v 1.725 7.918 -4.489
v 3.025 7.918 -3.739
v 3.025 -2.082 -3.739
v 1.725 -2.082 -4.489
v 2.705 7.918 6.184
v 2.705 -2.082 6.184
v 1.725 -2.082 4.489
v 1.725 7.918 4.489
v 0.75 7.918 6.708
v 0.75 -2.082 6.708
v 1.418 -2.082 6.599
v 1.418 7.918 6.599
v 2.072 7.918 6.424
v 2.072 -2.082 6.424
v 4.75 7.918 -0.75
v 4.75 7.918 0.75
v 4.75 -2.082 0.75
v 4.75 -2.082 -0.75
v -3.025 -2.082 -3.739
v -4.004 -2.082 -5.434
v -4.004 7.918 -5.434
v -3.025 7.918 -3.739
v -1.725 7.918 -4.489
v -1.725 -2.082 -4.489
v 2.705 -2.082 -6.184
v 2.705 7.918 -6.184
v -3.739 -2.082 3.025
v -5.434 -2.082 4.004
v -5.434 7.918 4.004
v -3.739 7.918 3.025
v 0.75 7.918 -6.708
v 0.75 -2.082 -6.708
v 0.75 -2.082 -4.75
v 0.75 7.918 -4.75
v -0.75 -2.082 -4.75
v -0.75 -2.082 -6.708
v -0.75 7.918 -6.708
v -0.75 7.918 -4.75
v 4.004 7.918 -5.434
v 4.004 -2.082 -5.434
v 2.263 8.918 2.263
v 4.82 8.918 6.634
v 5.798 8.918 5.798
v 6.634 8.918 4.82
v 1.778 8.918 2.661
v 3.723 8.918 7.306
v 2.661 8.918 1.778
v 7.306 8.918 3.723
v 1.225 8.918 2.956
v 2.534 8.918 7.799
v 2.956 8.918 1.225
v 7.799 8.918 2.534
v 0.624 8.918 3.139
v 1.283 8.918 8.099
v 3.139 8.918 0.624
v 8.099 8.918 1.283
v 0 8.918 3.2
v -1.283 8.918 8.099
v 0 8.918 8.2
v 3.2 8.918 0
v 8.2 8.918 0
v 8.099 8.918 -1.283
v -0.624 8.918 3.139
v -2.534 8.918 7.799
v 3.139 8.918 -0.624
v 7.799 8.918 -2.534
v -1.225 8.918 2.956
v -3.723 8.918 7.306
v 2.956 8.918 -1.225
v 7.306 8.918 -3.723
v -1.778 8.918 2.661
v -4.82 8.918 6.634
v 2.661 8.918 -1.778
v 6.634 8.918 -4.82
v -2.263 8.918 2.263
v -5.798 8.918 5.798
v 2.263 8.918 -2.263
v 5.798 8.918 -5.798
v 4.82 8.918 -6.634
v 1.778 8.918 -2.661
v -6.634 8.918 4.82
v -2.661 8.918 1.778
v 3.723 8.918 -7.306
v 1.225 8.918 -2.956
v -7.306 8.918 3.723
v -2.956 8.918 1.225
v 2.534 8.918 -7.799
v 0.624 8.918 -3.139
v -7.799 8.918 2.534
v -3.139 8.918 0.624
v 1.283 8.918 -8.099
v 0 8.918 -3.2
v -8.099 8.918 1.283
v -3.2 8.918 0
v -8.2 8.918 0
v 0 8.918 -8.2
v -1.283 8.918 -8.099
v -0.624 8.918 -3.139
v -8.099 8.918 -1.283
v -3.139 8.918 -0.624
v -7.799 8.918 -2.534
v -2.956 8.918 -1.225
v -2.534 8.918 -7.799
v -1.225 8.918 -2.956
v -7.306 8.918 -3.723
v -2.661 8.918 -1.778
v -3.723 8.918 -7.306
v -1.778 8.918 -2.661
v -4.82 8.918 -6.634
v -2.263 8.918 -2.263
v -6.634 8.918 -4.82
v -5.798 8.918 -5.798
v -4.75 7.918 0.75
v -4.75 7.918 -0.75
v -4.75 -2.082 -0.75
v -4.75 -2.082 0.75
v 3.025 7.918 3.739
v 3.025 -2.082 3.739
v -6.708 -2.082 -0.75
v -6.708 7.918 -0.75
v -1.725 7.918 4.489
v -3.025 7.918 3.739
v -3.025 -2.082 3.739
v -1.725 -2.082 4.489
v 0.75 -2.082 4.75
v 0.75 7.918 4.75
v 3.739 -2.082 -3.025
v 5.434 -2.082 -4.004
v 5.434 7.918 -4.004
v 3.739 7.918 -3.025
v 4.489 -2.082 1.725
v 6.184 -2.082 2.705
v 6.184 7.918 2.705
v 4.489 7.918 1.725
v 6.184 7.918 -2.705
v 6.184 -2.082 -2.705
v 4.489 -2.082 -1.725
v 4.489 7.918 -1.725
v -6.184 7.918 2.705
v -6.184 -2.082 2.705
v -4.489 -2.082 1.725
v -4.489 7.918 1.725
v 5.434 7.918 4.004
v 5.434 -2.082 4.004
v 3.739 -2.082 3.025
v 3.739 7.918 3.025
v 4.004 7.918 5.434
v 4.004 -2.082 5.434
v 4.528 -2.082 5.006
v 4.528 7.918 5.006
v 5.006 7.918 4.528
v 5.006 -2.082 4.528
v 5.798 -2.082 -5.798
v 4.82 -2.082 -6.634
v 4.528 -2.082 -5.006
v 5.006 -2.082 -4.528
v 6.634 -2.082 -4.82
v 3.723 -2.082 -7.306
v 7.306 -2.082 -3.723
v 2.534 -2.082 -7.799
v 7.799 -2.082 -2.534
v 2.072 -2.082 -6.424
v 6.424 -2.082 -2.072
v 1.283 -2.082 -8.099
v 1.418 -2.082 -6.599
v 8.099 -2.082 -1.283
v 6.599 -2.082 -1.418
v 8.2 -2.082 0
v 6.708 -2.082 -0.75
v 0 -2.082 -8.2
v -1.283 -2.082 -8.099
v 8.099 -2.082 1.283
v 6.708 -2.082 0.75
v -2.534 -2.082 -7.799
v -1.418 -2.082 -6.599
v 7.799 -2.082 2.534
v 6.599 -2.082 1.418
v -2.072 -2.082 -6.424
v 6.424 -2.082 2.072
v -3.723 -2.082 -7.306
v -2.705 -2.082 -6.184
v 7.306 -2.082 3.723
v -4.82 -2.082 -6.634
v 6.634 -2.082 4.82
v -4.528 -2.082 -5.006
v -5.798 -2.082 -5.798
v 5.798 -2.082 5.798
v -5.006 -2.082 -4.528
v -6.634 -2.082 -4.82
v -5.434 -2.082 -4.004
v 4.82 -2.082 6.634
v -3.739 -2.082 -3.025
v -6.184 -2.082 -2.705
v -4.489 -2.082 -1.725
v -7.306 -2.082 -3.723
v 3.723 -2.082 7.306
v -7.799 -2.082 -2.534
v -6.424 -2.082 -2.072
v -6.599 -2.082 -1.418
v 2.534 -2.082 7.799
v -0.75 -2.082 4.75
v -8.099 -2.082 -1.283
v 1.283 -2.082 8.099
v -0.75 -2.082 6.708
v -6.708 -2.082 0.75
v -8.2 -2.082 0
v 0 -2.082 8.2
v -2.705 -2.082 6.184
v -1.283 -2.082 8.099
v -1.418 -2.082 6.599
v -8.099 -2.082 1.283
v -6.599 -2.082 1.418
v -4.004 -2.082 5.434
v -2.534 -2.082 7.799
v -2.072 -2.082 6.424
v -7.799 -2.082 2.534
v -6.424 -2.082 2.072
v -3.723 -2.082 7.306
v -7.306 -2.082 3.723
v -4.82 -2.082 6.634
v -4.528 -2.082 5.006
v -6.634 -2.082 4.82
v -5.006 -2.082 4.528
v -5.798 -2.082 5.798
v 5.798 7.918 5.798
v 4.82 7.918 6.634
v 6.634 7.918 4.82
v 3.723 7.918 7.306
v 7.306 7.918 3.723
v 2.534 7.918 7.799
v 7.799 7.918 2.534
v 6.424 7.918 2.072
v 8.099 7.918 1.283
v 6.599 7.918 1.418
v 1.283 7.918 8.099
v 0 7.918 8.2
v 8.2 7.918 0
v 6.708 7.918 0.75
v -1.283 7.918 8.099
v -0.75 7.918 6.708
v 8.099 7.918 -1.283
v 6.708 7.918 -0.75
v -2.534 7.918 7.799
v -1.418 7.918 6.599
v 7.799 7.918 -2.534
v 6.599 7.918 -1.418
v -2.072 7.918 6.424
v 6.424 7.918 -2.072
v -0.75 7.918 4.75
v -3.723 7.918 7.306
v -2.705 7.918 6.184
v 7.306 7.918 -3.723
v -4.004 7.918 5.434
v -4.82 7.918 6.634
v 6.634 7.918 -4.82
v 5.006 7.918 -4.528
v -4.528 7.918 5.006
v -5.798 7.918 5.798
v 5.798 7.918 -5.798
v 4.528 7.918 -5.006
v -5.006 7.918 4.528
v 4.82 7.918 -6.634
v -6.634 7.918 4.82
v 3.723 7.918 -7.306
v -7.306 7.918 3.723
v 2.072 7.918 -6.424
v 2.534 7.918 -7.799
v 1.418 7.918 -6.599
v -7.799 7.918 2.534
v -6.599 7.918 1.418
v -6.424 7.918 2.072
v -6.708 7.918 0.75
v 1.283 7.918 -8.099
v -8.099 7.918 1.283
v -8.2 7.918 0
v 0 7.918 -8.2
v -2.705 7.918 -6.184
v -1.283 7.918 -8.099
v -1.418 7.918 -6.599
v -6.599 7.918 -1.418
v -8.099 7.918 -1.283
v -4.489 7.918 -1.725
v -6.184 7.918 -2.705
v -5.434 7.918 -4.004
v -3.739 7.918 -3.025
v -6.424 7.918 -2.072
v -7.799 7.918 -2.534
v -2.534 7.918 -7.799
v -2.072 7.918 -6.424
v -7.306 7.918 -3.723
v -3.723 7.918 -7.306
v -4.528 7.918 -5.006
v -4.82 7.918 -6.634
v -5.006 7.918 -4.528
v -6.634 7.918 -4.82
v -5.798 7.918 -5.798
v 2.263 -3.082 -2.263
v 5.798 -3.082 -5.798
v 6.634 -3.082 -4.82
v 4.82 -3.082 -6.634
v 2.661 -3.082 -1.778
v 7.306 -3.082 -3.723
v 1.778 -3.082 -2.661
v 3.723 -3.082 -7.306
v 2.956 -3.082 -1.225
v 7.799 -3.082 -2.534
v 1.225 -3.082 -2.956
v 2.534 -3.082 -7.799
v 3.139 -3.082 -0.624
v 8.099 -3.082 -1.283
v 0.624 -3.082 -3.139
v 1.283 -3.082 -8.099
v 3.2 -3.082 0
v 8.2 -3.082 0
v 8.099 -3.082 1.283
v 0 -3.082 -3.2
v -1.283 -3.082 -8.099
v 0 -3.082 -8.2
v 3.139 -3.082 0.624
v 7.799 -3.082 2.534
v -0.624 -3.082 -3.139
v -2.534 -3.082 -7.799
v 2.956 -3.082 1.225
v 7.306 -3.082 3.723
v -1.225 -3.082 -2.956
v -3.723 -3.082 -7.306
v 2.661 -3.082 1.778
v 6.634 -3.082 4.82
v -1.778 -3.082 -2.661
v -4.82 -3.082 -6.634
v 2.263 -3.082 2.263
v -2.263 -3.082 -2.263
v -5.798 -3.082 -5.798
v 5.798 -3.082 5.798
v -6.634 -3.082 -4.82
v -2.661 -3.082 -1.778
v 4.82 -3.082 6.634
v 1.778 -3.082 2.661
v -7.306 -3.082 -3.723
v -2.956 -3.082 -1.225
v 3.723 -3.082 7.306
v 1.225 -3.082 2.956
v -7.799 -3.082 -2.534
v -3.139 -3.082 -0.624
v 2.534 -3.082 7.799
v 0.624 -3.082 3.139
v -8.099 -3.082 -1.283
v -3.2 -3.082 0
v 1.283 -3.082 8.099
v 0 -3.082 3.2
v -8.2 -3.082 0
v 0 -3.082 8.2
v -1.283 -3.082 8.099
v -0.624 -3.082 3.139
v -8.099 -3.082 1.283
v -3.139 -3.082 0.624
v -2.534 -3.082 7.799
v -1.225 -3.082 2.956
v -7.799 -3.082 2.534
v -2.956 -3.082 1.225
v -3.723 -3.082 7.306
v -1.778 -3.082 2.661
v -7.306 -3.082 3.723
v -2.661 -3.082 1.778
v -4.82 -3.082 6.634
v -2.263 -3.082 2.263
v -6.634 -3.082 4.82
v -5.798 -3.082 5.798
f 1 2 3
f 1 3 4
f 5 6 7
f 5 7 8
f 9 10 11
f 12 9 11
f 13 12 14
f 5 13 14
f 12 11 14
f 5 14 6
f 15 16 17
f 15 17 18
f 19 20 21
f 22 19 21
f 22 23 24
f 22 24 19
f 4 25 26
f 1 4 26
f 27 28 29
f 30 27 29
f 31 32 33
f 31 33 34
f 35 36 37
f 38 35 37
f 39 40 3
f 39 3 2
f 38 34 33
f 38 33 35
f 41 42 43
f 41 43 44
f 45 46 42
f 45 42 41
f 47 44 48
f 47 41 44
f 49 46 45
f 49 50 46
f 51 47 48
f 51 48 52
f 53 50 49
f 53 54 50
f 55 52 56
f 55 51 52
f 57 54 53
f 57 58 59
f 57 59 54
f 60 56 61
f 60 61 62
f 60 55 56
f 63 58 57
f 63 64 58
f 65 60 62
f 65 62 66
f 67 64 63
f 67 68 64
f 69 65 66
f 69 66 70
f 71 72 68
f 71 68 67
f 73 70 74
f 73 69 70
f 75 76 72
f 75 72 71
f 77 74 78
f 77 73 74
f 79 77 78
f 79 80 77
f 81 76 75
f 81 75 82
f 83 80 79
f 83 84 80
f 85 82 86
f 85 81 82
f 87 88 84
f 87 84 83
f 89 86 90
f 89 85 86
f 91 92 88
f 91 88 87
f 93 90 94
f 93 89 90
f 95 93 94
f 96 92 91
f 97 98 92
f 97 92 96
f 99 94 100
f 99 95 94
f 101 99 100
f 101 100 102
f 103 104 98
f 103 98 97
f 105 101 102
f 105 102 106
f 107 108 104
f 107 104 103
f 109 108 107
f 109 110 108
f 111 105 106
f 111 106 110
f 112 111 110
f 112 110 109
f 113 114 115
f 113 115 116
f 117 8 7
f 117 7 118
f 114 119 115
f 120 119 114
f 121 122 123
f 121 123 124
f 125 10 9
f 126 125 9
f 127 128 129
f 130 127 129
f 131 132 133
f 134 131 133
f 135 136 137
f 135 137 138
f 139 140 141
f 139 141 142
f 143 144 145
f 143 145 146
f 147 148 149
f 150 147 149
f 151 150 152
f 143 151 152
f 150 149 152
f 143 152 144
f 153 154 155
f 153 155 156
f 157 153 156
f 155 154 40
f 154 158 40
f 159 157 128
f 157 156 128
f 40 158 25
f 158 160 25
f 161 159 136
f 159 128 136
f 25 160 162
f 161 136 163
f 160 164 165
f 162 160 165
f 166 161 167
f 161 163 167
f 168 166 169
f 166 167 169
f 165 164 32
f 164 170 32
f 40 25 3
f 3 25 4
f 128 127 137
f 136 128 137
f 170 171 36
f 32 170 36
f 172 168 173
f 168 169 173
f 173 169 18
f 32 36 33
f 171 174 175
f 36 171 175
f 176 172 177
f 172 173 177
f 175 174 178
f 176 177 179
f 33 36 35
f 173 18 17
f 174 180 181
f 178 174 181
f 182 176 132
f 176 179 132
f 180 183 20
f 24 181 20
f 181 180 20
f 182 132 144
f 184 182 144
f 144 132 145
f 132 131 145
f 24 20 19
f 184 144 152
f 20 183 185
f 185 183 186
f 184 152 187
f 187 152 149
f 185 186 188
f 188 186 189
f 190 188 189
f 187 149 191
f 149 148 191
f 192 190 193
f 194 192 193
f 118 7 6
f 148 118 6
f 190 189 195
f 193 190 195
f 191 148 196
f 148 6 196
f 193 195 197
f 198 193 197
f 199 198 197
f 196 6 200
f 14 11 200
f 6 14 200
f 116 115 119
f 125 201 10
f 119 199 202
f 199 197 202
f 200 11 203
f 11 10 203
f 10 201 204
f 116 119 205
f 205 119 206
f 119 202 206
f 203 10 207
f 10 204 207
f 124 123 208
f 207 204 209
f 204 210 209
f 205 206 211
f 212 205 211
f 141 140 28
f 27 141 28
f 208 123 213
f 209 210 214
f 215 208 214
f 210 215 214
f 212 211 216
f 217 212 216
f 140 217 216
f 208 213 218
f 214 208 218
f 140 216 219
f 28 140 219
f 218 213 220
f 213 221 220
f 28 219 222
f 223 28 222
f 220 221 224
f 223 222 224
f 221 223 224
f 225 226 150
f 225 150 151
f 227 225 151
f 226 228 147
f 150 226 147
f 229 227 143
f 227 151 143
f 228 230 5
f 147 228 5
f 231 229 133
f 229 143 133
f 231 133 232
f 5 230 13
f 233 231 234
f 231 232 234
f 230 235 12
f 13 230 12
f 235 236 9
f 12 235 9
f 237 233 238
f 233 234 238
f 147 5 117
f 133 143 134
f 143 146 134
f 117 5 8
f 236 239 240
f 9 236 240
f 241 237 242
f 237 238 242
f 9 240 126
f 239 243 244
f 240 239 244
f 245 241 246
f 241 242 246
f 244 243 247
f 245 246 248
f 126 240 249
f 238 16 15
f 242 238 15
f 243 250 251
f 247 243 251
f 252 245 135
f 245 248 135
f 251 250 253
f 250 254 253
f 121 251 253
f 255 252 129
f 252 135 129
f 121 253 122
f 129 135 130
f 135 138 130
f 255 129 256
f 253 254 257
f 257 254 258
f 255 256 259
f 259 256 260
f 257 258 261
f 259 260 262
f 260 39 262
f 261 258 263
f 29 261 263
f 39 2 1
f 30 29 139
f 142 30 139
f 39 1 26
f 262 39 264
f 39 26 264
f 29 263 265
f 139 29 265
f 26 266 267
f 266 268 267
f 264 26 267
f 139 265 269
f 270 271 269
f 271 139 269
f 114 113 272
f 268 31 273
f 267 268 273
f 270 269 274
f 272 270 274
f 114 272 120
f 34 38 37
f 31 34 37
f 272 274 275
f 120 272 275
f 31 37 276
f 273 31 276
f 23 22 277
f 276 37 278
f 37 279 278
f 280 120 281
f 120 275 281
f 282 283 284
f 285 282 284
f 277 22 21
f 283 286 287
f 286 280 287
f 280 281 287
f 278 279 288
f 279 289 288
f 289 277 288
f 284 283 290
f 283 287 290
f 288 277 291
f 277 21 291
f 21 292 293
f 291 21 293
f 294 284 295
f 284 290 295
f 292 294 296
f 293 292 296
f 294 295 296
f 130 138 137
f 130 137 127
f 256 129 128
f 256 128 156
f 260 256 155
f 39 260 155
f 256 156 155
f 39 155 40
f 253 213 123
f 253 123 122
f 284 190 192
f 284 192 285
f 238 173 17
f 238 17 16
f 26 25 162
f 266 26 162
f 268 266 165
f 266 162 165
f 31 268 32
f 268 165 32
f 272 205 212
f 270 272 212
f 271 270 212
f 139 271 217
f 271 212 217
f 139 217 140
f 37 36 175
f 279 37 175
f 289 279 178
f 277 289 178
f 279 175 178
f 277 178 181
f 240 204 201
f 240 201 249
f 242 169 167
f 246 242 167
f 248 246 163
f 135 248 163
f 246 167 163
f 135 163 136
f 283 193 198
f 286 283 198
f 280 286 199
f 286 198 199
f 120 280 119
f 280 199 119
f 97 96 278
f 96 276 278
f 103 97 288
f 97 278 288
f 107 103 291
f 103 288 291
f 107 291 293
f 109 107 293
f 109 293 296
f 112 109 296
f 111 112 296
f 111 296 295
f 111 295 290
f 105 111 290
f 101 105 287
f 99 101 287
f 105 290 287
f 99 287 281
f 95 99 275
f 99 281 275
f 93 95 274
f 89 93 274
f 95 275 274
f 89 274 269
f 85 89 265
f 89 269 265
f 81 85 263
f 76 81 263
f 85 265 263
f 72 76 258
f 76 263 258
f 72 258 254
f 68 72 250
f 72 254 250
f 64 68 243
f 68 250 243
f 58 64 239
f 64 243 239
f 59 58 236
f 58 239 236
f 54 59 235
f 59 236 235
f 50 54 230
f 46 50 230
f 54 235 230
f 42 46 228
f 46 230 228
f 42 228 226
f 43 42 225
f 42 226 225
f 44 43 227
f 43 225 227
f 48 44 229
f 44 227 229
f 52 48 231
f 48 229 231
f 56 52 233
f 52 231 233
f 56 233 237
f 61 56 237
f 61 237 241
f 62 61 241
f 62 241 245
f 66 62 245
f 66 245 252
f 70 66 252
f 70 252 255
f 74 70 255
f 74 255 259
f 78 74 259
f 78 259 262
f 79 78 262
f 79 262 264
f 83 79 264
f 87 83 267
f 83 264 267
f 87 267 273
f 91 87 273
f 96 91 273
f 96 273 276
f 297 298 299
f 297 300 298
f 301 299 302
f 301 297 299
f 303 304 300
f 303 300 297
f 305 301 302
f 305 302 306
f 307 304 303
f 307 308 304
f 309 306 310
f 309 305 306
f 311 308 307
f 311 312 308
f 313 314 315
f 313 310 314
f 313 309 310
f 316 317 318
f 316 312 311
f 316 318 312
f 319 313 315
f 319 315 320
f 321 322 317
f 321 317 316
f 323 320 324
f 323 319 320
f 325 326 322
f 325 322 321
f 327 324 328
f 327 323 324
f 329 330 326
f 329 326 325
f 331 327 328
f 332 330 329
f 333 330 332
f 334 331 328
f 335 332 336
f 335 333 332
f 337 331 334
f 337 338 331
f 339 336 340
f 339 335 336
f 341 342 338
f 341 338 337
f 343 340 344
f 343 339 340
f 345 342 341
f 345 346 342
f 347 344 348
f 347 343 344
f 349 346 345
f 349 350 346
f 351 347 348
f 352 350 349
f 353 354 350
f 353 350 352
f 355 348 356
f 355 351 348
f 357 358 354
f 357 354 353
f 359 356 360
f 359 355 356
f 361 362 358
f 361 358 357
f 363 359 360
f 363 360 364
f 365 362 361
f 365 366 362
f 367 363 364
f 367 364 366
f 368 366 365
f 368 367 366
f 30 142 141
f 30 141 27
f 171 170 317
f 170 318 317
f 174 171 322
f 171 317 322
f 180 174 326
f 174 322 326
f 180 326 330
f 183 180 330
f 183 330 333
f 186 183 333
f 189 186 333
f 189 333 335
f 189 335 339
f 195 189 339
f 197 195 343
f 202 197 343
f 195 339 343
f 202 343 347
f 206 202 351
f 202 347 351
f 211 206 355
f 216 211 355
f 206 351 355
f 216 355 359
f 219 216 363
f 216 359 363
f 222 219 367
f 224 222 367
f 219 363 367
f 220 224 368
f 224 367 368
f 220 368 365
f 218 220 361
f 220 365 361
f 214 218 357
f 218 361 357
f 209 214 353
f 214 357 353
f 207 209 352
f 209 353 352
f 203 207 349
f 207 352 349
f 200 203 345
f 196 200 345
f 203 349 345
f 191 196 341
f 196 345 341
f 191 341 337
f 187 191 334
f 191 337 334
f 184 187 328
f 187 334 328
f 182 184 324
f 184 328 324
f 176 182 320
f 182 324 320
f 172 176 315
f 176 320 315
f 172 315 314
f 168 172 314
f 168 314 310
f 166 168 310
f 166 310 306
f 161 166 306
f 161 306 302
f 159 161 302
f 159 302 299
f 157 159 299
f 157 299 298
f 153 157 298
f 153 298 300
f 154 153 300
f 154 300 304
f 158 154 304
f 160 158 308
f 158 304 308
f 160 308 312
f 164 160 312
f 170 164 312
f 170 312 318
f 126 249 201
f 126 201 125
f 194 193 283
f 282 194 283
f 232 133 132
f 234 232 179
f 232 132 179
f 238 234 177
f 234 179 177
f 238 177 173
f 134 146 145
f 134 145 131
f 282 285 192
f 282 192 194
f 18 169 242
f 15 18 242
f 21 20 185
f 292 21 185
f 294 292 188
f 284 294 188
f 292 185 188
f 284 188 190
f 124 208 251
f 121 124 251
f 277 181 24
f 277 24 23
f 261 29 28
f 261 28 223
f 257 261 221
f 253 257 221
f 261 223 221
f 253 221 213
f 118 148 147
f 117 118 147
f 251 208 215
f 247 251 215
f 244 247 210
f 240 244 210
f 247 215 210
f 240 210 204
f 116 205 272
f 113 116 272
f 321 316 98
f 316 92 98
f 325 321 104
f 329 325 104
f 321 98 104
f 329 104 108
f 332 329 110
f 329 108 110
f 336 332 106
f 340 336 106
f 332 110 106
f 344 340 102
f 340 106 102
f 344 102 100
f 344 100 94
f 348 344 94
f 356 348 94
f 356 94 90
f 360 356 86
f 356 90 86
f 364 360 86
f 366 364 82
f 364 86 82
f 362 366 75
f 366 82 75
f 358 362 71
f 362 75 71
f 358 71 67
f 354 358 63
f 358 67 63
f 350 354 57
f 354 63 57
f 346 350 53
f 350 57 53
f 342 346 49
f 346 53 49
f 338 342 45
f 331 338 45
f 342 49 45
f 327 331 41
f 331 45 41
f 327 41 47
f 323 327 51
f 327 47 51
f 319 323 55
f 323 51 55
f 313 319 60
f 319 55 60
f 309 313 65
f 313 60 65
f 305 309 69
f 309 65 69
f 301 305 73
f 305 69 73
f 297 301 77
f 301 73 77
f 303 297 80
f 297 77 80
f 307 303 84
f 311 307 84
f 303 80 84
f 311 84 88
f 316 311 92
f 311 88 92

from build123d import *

# Parameters (mm, degrees)
SKETCH3_W          = 1.5
SKETCH3_H          = 10
CUT_EXTRUDE1_DEPTH = 2
CIRPATTERN1_COUNT  = 12


with BuildPart() as part:
    # Sketch1 → Revolve1 (revolve)
    with BuildSketch(Plane.XY, mode=Mode.PRIVATE) as revolve1_sk:
        Polygon((3.2, 8.917647059), (6.75, 8.917647059), (8.2, 8.917647059), (8.2, 7.917647059), (6.75, 7.917647059), (6.75, -2.082352941), (8.2, -2.082352941), (8.2, -3.082352941), (6.75, -3.082352941), (3.2, -3.082352941), align=None)
    revolve(revolve1_sk.sketch.rotate(Axis((0, 0, 0), (0, 1, 0)), 90), axis=Axis((0, 0, 0), (0, 1, 0)))  # turned: the seam where the file's is

    # Sketch3 → Cut-Extrude1 (cut)
    with BuildSketch(Plane(origin=(0, 0, -6.75), x_dir=(-1, 0, 0), z_dir=(0, 0, -1))):
        with Locations((0, 2.917647059)):
            Rectangle(SKETCH3_W, SKETCH3_H)
    cut_extrude1 = extrude(amount=-CUT_EXTRUDE1_DEPTH, mode=Mode.SUBTRACT)

    # CirPattern1: Cut-Extrude1 ×12 about axis
    cirpattern1_axis = Axis((0, 0, 0), (0, 1, 0))
    for i in range(1, CIRPATTERN1_COUNT):
        add(cut_extrude1.rotate(cirpattern1_axis, i * 360 / CIRPATTERN1_COUNT), mode=Mode.SUBTRACT)


solid = part.part
